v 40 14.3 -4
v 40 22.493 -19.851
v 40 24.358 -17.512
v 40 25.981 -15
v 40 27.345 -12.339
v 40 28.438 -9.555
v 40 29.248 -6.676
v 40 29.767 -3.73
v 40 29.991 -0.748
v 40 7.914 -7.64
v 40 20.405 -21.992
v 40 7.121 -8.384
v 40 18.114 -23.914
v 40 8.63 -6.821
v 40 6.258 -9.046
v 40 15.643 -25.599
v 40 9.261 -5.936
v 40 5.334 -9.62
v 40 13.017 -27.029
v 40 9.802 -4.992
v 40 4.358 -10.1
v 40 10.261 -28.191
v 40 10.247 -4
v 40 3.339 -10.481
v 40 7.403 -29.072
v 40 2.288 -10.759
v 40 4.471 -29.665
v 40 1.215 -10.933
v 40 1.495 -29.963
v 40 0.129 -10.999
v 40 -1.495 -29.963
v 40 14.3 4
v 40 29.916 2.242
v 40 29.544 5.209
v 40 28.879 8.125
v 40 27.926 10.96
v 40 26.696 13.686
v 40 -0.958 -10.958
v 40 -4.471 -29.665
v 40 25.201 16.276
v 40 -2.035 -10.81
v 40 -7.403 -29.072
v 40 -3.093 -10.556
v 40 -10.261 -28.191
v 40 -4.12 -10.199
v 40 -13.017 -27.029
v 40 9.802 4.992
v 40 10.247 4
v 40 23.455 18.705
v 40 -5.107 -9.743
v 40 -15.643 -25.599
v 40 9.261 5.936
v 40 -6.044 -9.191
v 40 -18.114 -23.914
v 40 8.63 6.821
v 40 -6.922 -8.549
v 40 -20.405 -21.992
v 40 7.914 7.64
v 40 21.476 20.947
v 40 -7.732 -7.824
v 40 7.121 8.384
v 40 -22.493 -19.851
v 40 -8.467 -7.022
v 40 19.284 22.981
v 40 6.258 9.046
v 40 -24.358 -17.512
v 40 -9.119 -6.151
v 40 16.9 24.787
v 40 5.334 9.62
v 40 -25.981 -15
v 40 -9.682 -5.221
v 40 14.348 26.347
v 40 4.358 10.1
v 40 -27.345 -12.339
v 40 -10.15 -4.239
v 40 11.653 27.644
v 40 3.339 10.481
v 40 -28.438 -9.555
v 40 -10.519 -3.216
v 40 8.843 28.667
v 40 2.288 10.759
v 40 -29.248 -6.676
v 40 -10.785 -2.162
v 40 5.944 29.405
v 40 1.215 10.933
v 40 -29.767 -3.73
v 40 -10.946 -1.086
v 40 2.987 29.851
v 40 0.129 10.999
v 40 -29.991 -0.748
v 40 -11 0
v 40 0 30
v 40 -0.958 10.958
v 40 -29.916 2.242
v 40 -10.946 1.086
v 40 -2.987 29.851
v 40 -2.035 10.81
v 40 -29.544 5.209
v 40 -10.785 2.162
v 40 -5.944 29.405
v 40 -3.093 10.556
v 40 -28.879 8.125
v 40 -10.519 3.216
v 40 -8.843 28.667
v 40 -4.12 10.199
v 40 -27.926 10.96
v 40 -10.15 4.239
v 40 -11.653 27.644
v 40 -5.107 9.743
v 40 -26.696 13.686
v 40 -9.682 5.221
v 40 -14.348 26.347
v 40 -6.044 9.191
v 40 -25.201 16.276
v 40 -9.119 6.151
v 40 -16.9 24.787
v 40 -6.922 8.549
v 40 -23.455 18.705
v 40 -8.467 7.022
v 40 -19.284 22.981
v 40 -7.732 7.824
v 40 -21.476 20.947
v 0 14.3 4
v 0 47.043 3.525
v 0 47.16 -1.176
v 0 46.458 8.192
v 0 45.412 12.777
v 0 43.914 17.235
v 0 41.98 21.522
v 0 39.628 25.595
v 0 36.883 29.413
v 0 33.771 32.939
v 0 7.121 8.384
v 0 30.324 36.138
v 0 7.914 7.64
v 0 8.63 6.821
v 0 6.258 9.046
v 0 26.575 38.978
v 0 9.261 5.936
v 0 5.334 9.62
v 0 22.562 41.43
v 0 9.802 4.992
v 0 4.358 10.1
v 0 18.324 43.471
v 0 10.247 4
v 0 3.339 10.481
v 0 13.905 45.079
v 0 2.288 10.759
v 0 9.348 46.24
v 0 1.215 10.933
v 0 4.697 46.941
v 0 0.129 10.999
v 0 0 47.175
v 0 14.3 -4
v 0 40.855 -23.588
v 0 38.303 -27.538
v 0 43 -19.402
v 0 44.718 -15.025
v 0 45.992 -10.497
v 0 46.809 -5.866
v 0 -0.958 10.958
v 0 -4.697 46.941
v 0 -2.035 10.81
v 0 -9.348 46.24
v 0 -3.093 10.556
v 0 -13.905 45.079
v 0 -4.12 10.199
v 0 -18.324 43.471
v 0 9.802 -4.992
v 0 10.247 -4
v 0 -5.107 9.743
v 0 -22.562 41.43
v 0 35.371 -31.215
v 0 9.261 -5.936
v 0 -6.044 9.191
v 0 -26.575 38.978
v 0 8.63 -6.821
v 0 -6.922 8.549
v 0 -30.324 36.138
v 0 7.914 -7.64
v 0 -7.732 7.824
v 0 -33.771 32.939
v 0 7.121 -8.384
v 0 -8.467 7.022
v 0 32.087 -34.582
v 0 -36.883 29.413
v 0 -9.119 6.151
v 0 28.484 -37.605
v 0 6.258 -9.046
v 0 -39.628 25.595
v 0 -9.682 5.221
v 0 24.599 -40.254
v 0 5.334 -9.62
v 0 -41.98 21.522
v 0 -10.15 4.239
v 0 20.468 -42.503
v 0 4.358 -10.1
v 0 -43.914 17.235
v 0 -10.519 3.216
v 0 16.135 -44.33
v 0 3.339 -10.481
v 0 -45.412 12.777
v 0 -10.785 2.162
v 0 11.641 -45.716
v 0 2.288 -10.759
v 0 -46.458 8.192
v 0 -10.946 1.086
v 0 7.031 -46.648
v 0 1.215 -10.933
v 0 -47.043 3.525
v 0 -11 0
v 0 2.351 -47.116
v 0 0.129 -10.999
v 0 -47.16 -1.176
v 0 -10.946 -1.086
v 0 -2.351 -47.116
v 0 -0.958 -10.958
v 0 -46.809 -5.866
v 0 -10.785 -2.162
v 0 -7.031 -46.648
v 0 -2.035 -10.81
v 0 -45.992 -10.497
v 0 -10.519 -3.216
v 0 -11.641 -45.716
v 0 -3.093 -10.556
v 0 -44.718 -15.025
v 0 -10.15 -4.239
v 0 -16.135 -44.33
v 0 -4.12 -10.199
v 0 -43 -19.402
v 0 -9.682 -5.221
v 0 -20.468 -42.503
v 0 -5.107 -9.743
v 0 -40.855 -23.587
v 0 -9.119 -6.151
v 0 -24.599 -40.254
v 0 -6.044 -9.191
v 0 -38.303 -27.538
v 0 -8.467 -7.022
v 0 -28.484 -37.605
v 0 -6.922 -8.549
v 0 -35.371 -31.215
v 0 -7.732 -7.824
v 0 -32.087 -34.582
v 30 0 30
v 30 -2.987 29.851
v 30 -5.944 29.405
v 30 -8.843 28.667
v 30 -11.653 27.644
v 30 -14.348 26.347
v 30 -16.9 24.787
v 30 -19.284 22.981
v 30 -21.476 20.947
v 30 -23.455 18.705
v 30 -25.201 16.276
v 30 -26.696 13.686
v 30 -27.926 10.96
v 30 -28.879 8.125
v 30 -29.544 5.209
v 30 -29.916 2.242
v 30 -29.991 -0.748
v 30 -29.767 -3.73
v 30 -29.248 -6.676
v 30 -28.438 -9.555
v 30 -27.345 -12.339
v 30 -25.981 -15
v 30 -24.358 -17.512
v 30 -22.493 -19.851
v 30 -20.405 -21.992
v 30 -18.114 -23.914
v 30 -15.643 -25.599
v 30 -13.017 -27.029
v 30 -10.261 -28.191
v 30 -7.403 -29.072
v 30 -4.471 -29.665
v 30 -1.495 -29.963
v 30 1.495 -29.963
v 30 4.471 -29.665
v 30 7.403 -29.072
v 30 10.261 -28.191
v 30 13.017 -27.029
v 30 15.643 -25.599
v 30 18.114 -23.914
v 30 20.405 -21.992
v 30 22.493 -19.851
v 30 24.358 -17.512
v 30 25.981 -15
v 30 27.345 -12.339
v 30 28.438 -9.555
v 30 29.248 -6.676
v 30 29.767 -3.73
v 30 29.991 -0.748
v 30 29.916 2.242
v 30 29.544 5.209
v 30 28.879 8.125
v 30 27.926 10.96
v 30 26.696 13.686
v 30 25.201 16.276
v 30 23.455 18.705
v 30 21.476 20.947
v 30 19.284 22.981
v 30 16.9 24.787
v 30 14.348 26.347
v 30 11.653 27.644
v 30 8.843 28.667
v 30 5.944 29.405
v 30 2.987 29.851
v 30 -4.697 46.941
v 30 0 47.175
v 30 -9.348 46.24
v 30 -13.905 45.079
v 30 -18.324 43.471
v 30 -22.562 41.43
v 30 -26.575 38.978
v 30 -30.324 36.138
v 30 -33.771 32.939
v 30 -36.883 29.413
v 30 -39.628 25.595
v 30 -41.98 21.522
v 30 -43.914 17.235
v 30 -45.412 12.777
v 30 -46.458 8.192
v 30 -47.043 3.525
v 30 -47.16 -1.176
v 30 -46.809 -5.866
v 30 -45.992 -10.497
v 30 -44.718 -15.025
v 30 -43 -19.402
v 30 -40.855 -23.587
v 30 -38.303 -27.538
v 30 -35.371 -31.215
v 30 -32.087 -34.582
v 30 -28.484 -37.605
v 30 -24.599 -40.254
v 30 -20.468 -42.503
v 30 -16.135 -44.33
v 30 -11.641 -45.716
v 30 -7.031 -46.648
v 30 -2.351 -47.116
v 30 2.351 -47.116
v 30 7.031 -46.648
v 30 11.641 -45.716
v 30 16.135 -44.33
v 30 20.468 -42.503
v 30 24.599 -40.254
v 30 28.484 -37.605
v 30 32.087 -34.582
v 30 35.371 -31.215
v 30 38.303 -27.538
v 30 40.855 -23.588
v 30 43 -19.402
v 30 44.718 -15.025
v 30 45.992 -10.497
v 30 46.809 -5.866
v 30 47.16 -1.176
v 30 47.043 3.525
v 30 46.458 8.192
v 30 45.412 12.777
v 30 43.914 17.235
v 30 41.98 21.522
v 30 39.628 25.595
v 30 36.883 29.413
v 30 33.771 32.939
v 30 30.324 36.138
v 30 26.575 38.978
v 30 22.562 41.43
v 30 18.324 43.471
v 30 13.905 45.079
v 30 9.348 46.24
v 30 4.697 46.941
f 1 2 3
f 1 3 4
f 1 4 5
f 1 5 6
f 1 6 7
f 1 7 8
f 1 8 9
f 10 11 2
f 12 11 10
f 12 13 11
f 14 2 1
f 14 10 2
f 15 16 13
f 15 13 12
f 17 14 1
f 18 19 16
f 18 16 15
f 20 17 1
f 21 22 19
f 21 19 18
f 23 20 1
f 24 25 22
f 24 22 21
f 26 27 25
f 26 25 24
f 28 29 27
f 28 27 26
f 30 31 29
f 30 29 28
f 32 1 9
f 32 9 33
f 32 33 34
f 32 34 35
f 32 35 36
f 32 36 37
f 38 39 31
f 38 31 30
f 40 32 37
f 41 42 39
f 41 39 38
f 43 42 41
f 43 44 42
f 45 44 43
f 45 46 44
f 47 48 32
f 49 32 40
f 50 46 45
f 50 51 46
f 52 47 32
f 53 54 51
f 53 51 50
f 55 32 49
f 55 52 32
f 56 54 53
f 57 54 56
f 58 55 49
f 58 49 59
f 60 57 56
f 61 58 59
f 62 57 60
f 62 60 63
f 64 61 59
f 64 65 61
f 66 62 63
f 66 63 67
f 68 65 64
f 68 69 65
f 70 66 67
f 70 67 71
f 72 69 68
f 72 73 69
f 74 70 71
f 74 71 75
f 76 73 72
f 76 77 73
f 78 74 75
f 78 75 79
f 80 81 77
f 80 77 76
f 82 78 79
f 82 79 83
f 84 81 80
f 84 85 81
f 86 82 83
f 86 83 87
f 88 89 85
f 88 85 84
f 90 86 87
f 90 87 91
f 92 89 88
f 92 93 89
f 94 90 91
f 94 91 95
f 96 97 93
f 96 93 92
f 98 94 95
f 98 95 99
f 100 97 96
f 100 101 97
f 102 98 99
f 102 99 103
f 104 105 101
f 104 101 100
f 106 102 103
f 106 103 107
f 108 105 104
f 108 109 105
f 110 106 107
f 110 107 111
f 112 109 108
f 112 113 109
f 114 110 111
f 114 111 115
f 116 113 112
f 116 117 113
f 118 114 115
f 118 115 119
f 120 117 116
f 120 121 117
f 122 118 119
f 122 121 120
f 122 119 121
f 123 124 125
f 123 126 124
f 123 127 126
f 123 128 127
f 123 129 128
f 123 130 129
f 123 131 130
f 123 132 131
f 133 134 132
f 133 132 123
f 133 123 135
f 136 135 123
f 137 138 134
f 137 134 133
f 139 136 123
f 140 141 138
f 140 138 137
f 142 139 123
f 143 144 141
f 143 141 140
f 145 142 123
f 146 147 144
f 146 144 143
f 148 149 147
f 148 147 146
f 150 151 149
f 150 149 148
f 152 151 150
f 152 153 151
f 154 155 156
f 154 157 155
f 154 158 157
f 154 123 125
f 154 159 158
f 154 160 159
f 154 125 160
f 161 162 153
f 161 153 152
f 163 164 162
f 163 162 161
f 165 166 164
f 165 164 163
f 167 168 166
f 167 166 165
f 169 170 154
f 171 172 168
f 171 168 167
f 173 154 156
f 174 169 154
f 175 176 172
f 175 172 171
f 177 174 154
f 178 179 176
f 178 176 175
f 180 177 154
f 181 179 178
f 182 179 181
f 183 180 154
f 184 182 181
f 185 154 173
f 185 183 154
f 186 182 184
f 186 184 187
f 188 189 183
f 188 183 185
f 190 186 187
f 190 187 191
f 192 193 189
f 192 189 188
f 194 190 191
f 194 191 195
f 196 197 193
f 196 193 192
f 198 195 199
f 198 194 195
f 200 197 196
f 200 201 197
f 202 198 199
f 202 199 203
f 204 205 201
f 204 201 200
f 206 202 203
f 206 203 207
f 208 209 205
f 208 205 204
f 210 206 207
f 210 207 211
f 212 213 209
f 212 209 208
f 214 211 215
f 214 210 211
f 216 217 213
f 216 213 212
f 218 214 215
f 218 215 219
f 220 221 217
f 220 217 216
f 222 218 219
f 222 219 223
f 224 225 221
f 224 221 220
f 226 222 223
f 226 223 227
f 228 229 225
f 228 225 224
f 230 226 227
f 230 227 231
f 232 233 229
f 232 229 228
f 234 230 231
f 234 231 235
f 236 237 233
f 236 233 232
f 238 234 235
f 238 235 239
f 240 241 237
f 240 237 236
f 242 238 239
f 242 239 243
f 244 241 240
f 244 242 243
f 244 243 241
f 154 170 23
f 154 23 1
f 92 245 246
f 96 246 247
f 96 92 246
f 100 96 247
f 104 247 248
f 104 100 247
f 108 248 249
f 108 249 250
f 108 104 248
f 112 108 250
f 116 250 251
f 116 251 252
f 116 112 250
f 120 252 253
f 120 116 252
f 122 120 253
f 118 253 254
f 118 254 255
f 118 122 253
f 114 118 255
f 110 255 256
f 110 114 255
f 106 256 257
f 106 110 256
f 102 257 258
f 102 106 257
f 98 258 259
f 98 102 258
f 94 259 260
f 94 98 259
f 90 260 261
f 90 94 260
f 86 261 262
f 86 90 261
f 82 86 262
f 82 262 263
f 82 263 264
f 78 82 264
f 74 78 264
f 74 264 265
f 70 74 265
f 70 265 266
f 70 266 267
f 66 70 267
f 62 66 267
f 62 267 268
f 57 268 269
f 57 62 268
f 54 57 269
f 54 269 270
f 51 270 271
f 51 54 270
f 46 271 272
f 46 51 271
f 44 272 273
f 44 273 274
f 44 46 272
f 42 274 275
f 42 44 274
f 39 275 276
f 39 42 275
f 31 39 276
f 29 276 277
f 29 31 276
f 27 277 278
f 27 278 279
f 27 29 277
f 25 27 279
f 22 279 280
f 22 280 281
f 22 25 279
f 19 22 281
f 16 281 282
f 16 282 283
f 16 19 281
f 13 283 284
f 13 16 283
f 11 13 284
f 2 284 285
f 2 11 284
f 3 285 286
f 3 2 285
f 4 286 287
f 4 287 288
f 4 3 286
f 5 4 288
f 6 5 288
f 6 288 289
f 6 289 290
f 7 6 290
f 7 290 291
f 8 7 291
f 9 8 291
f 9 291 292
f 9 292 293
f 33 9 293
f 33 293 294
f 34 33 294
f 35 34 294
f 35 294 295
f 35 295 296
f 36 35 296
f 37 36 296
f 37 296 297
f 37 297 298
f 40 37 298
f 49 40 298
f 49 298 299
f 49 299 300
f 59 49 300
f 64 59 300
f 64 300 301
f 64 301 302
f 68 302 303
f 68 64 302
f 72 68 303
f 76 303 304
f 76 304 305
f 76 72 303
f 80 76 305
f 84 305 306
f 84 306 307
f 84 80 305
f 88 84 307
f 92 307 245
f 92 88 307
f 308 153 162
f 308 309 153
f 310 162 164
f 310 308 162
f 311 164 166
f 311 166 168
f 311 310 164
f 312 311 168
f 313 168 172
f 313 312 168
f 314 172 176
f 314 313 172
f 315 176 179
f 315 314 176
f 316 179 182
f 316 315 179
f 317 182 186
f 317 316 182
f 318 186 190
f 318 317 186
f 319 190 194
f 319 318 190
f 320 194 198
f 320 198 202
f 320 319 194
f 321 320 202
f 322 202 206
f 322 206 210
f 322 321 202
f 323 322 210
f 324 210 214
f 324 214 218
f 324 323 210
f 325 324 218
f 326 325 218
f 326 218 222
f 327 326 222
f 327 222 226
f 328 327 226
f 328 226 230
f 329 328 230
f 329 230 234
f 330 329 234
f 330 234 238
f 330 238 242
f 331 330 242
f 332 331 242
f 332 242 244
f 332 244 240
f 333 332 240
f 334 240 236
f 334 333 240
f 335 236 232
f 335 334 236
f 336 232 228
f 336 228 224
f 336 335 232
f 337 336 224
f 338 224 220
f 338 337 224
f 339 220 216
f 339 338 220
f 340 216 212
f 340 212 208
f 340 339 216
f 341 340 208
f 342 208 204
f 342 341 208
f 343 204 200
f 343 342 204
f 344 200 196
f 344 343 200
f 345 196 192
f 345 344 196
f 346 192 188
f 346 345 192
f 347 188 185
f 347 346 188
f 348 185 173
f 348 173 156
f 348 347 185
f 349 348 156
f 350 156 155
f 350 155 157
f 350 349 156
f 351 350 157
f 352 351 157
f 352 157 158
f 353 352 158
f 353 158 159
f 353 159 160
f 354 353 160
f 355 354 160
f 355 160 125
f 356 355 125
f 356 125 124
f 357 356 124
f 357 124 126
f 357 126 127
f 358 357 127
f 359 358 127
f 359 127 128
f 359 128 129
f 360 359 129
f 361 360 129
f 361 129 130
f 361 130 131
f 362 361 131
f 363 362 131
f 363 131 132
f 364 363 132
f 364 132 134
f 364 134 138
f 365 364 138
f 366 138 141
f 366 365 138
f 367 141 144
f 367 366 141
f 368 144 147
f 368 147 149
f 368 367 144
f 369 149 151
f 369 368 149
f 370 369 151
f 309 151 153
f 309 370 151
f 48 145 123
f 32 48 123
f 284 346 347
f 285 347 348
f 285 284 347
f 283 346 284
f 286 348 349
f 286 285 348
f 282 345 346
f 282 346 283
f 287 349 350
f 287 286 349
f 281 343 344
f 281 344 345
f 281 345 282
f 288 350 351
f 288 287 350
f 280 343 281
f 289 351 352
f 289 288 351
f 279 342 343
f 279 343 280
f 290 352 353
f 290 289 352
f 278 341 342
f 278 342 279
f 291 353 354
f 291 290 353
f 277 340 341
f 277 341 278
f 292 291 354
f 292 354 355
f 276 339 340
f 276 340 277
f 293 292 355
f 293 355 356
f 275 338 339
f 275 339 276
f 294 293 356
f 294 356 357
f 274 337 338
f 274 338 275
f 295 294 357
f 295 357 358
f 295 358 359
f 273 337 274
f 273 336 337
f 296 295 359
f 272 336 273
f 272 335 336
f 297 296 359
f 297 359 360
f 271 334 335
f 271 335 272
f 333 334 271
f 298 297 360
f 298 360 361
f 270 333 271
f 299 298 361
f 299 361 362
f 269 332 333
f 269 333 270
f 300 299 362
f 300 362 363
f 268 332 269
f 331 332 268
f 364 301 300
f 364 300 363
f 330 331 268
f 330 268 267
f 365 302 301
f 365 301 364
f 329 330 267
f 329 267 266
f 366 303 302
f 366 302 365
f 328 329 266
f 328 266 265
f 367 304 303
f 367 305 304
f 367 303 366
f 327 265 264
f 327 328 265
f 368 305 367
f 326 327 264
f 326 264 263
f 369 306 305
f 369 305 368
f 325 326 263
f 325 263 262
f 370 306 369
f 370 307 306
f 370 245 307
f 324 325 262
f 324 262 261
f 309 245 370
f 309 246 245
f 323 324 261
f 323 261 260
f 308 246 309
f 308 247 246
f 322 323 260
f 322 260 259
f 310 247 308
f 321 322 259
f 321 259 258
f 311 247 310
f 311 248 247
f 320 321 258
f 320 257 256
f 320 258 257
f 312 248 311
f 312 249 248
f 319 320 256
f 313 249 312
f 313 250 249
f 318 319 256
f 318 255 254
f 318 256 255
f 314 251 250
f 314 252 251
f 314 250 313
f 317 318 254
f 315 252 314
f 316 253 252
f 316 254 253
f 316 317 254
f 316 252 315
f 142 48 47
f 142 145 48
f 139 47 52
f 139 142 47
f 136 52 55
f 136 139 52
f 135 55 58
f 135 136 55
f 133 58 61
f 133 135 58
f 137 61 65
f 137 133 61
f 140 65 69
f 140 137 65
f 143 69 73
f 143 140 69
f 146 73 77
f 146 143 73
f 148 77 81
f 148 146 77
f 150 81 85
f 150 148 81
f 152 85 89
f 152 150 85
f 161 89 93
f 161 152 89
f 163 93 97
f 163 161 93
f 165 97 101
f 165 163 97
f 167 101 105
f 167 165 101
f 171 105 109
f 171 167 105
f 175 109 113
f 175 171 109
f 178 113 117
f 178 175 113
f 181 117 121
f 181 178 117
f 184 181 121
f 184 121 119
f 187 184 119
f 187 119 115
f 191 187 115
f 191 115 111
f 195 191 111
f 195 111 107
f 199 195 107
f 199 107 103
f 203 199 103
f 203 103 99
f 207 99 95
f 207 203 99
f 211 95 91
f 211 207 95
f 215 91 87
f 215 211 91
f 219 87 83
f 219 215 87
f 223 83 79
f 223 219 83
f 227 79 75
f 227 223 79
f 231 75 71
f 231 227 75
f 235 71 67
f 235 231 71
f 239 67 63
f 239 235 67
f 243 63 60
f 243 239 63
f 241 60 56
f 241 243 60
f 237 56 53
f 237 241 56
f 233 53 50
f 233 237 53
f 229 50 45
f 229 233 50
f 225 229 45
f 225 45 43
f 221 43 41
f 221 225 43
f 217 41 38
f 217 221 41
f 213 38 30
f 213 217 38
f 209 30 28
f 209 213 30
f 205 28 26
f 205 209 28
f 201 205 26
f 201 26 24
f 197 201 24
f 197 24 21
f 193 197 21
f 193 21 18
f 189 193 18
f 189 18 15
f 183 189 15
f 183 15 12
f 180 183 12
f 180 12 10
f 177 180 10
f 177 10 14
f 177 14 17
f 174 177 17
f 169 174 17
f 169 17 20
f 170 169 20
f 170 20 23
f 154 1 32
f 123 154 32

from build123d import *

# Parameters (mm, degrees)
SKETCH2_W          = 8
SKETCH2_H          = 6.6
CUT_EXTRUDE1_DEPTH = 78.787924834


with BuildPart() as part:
    # Sketch1 → Revolve1 (revolve)
    with BuildSketch(Plane.XY, mode=Mode.PRIVATE) as revolve1_sk:
        Polygon((0, 11), (0, 47.175), (30, 47.175), (30, 30), (40, 30), (40, 11), align=None)
    revolve(revolve1_sk.sketch.rotate(Axis((0, 0, 0), (1, 0, 0)), 90), axis=Axis((0, 0, 0), (1, 0, 0)))

    # Sketch2 → Cut-Extrude1 (cut, through all)
    with BuildSketch(Plane.ZY):
        with Locations((0, 11)):
            Rectangle(SKETCH2_W, SKETCH2_H)
    extrude(amount=-CUT_EXTRUDE1_DEPTH, mode=Mode.SUBTRACT)


solid = part.part
